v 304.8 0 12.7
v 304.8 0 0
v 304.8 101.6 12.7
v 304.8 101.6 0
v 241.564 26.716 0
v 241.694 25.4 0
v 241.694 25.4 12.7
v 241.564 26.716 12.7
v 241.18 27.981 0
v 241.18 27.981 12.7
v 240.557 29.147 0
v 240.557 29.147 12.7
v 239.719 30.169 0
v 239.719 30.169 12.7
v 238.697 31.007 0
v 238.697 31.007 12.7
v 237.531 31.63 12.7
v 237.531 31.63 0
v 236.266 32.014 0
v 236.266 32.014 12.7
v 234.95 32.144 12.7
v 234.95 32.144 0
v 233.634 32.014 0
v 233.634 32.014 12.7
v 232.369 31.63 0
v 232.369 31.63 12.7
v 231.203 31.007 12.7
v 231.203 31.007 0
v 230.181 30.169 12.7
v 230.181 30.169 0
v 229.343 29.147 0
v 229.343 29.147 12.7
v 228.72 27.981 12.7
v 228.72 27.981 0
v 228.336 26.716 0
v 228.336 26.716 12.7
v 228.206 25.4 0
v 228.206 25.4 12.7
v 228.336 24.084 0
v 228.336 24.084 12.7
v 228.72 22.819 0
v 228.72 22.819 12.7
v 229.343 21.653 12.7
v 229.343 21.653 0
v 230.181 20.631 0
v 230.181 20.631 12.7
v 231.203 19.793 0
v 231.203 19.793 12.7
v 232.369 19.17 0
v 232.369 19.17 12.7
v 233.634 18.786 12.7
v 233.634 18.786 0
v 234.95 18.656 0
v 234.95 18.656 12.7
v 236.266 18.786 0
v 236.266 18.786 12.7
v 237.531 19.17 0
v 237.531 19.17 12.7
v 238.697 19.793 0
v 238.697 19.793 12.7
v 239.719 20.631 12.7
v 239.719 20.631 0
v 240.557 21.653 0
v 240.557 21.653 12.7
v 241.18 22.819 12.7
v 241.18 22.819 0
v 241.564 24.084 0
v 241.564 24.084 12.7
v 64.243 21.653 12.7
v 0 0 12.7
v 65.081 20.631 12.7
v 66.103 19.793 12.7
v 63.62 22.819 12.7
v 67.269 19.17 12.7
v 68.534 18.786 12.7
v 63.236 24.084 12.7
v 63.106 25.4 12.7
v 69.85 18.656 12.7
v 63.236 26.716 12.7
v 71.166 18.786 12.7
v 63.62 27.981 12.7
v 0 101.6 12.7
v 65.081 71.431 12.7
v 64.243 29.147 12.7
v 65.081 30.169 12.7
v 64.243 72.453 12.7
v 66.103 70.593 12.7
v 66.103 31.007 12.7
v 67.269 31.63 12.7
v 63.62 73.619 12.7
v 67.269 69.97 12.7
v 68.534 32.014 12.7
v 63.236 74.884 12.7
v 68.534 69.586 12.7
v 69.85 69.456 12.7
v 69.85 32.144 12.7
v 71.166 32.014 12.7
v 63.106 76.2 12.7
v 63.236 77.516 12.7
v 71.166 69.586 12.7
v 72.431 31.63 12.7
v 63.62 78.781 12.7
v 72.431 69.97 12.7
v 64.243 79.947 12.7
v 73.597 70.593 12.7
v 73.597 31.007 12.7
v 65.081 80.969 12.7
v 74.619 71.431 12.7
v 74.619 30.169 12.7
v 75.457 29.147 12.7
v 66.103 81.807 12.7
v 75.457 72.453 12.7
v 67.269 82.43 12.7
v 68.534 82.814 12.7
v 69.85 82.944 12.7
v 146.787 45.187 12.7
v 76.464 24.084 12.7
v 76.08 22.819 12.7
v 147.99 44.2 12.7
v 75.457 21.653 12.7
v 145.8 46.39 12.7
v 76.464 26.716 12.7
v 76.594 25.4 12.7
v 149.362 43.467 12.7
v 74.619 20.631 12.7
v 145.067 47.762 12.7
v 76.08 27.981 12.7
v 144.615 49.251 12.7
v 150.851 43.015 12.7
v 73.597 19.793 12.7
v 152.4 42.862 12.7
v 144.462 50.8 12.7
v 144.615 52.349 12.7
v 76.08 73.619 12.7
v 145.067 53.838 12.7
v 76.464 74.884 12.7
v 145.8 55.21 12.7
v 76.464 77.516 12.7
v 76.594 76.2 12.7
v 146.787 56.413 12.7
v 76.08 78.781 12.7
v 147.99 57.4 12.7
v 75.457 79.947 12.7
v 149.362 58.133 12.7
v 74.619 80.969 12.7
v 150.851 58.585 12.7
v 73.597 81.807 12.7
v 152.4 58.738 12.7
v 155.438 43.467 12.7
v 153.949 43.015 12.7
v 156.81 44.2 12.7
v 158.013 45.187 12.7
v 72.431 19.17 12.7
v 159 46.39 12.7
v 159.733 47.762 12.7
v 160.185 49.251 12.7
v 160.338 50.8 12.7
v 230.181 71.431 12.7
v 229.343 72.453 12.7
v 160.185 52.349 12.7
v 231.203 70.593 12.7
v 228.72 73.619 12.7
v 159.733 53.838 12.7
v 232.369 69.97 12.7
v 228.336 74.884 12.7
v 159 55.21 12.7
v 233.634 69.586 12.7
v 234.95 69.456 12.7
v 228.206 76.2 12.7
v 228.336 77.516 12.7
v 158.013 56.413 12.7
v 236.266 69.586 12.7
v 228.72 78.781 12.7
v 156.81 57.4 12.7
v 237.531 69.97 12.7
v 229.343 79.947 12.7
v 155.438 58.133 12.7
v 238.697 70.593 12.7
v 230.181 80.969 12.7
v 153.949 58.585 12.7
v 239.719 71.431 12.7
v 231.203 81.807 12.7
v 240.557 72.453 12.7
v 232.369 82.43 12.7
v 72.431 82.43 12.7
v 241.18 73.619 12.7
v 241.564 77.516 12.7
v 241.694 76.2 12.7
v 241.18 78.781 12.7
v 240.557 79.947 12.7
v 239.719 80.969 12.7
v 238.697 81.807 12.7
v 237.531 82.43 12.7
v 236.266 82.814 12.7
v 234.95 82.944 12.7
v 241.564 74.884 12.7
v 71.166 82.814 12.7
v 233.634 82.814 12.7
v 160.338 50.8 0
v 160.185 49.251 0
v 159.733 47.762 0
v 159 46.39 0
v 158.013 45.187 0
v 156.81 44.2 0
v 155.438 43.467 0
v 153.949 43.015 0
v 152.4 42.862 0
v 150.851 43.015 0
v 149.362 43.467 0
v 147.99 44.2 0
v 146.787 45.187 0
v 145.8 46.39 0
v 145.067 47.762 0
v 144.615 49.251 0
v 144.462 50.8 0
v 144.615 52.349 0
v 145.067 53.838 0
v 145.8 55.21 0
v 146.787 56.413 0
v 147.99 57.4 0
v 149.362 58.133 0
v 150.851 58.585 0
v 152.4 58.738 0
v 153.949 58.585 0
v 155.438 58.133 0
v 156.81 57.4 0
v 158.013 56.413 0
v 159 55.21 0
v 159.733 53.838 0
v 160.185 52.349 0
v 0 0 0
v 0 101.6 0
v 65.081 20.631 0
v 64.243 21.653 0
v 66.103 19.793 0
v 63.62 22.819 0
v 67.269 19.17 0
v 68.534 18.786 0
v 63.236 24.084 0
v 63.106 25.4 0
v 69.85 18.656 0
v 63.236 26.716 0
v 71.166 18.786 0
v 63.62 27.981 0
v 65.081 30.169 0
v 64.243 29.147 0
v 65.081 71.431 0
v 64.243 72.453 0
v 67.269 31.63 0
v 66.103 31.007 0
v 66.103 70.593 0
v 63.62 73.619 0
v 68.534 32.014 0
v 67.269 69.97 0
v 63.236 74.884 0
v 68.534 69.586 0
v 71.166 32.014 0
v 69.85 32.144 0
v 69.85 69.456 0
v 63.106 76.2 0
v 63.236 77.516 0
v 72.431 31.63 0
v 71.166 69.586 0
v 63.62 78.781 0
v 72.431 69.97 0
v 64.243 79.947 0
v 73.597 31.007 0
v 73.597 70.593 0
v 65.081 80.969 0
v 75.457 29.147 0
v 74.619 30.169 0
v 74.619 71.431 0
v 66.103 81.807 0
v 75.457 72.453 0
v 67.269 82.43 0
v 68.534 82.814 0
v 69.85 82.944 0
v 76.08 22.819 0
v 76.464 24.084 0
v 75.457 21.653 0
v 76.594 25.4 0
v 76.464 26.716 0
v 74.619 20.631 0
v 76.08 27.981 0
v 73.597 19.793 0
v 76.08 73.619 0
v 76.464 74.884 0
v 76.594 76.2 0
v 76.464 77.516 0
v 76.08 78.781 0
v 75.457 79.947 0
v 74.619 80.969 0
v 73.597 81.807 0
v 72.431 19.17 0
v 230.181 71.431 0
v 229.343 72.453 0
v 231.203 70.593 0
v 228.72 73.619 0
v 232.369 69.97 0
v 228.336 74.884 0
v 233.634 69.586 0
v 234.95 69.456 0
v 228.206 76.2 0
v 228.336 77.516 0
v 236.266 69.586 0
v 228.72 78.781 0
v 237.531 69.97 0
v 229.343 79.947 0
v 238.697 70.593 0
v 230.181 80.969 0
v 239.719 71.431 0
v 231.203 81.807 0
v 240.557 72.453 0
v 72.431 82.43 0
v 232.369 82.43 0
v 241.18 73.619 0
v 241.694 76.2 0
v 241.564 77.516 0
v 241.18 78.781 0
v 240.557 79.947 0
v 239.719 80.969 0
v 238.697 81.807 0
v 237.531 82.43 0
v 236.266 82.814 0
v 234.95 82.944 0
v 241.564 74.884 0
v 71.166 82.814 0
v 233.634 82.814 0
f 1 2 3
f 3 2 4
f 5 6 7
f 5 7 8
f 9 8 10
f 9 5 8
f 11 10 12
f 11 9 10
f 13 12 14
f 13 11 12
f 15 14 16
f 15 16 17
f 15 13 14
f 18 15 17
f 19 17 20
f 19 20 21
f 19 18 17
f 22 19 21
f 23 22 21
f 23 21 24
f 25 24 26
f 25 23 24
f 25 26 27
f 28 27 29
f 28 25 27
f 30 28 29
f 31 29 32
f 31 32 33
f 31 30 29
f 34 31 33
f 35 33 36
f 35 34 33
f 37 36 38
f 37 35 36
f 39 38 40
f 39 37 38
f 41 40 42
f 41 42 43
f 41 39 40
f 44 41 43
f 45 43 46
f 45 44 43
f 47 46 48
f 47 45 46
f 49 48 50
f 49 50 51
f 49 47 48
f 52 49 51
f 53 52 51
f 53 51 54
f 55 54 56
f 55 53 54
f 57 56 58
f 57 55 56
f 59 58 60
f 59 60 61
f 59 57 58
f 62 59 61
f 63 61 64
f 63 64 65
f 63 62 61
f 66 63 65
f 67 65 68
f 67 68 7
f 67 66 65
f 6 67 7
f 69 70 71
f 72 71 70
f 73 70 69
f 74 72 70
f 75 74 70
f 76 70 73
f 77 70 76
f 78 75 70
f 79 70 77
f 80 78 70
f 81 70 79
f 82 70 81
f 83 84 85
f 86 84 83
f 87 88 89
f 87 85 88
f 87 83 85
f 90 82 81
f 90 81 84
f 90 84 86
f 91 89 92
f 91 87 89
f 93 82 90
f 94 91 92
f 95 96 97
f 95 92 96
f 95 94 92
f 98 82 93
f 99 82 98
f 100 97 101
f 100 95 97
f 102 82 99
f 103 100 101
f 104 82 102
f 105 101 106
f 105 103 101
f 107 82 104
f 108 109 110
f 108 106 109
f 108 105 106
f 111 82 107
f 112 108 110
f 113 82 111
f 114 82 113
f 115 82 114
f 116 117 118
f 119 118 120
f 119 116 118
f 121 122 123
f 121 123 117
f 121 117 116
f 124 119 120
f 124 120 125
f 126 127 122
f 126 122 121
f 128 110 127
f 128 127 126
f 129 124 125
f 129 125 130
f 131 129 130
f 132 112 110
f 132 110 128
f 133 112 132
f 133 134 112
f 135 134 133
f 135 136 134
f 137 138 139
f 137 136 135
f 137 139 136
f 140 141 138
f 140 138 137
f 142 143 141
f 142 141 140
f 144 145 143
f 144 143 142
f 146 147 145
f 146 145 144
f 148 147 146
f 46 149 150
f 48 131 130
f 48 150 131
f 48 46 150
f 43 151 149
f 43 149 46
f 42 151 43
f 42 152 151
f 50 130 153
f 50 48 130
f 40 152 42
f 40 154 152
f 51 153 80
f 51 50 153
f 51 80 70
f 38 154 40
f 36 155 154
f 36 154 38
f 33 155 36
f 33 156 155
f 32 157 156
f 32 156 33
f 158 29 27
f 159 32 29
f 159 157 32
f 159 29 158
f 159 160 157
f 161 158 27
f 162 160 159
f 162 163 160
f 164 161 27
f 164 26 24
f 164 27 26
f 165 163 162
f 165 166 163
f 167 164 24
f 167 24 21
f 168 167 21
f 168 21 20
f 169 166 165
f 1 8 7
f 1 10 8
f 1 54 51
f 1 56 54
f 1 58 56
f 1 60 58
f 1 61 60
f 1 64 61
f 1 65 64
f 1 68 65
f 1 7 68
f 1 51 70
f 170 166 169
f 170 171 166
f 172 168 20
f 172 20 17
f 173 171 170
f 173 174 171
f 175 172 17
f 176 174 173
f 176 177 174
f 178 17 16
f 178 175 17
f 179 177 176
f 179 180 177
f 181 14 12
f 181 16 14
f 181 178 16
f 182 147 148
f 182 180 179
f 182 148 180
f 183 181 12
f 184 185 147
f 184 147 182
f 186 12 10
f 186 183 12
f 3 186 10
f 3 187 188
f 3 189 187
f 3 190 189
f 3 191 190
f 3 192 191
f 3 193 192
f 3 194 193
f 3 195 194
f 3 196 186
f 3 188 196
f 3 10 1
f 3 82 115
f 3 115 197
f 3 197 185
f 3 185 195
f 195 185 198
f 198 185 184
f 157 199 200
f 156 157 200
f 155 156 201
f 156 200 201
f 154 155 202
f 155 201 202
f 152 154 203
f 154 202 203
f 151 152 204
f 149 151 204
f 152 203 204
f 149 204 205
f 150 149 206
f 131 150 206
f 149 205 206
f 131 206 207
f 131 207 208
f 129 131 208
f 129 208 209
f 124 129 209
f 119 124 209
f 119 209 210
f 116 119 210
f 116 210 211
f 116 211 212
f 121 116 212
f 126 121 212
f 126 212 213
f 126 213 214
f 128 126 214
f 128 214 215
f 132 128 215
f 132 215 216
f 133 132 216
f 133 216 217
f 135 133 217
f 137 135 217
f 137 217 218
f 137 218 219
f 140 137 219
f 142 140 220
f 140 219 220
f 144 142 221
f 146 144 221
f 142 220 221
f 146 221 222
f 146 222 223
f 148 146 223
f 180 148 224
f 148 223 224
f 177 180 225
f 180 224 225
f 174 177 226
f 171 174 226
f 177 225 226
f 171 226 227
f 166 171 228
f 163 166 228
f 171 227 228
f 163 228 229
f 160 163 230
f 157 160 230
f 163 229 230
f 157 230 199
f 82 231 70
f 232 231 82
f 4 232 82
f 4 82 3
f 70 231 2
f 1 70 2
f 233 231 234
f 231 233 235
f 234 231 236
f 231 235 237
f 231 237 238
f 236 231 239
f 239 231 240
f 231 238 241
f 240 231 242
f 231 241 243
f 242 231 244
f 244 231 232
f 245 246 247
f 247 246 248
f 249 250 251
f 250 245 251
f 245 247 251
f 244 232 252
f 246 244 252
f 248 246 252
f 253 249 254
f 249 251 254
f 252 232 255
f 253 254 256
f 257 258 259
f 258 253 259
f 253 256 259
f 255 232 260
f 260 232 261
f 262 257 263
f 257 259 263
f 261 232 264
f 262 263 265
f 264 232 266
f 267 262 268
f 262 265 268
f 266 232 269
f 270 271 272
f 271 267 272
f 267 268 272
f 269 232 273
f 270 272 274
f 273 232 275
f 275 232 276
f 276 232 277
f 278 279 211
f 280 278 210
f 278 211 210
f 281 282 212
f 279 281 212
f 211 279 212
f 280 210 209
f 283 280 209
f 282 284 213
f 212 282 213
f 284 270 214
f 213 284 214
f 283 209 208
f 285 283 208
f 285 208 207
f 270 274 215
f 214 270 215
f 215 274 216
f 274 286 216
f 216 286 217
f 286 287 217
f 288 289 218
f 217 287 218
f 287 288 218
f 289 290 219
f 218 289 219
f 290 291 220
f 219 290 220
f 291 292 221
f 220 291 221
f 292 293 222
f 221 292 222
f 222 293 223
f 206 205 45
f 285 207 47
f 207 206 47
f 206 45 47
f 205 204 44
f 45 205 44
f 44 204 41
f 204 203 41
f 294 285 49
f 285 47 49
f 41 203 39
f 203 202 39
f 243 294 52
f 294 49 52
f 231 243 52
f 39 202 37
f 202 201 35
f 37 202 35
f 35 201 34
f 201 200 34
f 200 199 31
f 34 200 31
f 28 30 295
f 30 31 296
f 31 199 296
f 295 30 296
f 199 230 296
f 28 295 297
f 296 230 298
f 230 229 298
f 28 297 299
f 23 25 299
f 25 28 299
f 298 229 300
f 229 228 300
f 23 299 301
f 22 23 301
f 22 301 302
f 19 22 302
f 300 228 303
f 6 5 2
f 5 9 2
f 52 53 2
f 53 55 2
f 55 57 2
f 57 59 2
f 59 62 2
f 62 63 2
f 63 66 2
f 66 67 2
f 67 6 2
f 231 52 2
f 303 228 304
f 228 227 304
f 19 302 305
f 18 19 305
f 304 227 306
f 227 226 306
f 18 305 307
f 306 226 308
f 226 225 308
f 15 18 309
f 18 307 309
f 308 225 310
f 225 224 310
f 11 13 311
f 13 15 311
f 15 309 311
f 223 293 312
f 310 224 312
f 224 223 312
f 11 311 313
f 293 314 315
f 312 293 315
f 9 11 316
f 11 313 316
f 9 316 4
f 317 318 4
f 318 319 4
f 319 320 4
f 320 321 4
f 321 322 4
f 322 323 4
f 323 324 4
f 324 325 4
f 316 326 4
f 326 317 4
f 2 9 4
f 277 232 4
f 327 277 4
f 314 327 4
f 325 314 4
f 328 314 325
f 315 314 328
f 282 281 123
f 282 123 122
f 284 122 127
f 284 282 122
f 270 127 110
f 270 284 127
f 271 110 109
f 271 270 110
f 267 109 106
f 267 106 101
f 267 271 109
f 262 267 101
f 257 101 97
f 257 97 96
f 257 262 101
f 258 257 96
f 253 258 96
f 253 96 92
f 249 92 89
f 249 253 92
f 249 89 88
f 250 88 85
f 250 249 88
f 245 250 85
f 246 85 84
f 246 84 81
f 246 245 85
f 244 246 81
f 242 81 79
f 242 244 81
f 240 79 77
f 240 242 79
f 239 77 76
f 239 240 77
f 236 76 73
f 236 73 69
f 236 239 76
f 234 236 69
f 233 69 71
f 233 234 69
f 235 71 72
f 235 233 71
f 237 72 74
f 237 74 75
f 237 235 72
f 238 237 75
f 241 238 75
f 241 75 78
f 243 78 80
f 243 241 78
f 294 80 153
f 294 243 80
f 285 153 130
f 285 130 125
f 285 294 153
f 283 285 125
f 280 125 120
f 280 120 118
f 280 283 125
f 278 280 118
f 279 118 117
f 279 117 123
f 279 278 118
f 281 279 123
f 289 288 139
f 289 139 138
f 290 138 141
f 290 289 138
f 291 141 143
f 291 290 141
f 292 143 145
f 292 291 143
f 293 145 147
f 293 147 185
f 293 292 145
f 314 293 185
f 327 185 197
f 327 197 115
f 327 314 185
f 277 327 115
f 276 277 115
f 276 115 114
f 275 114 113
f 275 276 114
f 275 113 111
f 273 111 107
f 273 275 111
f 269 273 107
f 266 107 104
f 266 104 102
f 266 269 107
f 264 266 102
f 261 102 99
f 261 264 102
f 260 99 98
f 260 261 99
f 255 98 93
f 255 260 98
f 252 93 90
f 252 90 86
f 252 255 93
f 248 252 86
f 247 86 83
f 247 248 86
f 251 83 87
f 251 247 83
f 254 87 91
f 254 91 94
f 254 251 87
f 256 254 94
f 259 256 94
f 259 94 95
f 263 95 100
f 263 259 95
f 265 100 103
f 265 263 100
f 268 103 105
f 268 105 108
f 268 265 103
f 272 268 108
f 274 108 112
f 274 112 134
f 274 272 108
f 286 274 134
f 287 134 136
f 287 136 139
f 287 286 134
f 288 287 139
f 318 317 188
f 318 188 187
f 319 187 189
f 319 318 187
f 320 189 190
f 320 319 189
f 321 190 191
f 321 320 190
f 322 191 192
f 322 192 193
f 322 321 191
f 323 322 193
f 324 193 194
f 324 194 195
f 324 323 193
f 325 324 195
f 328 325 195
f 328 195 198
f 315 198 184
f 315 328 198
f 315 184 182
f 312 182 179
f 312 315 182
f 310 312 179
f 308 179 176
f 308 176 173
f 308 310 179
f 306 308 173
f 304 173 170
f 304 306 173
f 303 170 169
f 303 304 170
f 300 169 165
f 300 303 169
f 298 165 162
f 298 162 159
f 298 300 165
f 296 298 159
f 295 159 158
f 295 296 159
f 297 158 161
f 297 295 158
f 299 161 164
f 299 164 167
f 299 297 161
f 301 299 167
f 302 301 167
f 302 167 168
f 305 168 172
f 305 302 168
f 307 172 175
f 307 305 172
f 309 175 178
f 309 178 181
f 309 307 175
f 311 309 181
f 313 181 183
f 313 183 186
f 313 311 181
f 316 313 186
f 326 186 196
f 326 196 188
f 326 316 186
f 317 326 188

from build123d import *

# Parameters (mm, degrees)
F0_W     = 304.8
F0_H     = 101.6
F0_R     = 6.7437
F1_DEPTH = 12.7
F2_R     = 7.9375
F3_DEPTH = 25.4


with BuildPart() as f1:
    # F0 (on Top) → F1 (new body)
    with BuildSketch(Plane.XY):
        with Locations((152.4, 50.8)):
            Rectangle(F0_W, F0_H)
        with Locations((69.85, 25.4)):
            Circle(F0_R, mode=Mode.SUBTRACT)
        with Locations((234.95, 25.4)):
            Circle(F0_R, mode=Mode.SUBTRACT)
        with Locations((69.85, 76.2)):
            Circle(F0_R, mode=Mode.SUBTRACT)
        with Locations((234.95, 76.2)):
            Circle(F0_R, mode=Mode.SUBTRACT)
    extrude(amount=F1_DEPTH)

    # F2 (on face) → F3 (cut)
    with BuildSketch(Plane(origin=(0, 0, 0), x_dir=(1, 0, 0), z_dir=(0, 0, -1))):
        with Locations((152.4, -50.8)):
            Circle(F2_R)
    extrude(amount=-F3_DEPTH, mode=Mode.SUBTRACT)


solid = f1.part
